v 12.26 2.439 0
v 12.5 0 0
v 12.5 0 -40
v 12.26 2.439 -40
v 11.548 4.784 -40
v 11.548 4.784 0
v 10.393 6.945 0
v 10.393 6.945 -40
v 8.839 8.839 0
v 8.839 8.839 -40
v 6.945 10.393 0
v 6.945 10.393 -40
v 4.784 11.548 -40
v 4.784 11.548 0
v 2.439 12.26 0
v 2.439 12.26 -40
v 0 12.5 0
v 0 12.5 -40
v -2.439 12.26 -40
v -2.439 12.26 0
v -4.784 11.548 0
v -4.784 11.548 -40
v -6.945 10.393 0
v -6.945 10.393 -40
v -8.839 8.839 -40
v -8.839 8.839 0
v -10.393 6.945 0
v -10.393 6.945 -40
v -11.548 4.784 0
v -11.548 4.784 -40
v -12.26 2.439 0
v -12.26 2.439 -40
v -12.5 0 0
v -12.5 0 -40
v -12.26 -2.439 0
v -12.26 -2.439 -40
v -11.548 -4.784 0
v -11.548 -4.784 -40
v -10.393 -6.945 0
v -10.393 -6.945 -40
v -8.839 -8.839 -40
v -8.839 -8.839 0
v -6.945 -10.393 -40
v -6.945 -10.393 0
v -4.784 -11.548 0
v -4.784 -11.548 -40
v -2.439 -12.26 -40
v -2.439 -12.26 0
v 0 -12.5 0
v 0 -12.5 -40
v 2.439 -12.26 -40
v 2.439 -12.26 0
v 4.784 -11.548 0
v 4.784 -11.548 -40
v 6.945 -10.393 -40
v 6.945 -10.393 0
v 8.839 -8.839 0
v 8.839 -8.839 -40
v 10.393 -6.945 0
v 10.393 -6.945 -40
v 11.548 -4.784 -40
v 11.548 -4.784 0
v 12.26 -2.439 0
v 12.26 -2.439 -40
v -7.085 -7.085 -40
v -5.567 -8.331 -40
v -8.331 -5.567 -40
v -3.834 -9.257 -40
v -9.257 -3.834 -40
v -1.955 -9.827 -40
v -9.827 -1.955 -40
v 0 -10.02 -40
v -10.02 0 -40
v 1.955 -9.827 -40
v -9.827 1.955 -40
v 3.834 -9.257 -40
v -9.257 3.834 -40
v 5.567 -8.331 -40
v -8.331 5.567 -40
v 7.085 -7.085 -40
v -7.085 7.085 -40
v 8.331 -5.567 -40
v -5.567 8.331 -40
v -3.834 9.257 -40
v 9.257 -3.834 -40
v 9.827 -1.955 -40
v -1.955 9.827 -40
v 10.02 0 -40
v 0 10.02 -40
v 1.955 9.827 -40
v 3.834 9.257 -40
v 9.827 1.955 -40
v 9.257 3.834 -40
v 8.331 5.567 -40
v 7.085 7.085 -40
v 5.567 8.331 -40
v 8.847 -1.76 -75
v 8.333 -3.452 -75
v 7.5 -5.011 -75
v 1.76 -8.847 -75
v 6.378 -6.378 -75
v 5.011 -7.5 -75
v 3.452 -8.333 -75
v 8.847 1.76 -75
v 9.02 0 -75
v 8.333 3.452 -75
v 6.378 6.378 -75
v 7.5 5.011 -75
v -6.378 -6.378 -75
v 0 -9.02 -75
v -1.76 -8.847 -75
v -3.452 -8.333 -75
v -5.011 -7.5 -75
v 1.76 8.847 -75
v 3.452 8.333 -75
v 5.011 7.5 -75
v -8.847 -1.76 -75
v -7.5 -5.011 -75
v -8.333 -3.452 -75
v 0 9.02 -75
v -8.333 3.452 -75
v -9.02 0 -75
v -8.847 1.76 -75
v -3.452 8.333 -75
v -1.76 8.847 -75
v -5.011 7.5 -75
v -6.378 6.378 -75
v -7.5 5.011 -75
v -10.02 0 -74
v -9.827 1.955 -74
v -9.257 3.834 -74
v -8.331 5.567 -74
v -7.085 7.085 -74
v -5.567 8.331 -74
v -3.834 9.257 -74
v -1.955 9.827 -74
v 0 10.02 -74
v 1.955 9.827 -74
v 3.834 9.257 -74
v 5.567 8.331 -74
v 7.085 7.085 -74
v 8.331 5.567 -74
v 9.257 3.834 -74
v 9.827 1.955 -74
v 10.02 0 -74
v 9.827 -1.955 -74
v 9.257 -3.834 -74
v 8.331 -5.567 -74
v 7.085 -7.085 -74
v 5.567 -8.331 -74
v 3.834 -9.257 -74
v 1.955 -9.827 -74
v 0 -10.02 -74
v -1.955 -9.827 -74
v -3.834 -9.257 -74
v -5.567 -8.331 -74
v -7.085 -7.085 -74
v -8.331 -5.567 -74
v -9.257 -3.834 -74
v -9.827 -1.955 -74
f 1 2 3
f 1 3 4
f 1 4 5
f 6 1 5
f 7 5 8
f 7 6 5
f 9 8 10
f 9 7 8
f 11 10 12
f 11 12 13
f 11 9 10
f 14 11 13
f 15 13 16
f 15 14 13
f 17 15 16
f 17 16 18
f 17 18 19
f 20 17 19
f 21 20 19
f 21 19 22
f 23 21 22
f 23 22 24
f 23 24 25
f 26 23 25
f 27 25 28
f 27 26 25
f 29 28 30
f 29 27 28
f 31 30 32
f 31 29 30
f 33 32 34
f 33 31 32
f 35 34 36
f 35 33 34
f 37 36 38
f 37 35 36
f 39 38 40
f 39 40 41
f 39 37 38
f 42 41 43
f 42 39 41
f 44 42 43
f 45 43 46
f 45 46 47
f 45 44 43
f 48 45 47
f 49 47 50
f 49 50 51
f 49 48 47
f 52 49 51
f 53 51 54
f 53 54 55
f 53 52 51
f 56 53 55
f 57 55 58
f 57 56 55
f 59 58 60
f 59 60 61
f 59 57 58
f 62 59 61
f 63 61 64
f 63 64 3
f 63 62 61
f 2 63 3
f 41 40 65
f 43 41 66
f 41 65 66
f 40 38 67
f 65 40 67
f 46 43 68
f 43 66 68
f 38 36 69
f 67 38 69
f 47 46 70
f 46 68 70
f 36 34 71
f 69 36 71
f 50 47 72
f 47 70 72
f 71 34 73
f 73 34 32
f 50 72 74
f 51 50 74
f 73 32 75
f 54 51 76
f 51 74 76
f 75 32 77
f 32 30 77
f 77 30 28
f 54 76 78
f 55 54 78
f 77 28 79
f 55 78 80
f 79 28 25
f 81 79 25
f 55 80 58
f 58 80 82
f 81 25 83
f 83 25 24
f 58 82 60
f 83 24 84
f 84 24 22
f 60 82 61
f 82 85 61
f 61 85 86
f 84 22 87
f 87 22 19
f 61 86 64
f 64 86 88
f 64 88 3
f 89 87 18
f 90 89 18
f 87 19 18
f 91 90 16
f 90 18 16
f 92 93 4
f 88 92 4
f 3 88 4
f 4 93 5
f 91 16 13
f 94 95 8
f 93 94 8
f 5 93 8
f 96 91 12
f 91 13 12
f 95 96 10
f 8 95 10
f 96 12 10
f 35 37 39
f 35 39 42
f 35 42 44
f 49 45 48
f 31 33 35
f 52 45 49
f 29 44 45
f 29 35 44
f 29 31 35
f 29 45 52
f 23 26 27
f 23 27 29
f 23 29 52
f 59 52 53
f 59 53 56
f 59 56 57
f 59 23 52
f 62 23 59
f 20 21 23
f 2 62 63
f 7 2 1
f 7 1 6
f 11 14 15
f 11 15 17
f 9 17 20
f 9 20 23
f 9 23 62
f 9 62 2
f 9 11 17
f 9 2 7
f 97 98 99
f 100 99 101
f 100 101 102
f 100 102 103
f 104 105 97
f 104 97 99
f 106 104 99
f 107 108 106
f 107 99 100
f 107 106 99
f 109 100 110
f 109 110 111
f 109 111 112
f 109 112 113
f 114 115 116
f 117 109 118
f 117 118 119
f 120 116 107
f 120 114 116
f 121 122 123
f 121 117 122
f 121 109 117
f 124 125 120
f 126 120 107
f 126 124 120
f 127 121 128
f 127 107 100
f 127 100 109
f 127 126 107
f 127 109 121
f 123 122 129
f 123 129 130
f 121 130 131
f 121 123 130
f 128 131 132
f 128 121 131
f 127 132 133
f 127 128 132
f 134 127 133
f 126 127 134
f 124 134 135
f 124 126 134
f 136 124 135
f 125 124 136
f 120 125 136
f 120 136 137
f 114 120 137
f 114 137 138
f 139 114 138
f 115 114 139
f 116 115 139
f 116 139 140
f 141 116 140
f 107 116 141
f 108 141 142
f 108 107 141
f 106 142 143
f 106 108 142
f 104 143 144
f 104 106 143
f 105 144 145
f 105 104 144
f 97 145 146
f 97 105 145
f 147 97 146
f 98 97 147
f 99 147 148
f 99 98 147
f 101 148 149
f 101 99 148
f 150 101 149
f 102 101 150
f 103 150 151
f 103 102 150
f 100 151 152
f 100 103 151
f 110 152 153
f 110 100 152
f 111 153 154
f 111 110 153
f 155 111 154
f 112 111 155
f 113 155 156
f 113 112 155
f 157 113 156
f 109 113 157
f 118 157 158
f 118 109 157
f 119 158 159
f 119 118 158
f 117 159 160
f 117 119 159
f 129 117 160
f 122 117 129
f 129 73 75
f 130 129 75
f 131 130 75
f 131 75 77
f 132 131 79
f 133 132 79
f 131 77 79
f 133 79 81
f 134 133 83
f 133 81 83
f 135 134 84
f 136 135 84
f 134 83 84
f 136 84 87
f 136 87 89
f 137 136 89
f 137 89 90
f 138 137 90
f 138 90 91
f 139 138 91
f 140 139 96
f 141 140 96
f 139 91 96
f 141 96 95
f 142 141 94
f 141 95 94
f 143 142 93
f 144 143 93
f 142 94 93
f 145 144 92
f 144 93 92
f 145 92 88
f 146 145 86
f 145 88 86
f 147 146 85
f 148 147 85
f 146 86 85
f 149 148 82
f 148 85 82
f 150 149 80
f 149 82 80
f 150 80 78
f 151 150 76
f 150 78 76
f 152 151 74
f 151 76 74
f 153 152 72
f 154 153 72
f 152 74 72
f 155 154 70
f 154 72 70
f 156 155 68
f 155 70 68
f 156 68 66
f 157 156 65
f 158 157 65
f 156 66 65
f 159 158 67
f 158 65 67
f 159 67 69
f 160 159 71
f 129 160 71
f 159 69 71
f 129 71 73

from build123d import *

# Parameters (mm, degrees)
SKETCH1_R           = 12.5
BOSS_EXTRUDE1_DEPTH = 40
SKETCH2_R           = 10.02
BOSS_EXTRUDE2_DEPTH = 35
CHAMFER1_SIZE       = 1


with BuildPart() as part:
    # Sketch1 → Boss-Extrude1 (new body)
    with BuildSketch(Plane.XY):
        Circle(SKETCH1_R)
    extrude(amount=-BOSS_EXTRUDE1_DEPTH)

    # Sketch2 → Boss-Extrude2 (add)
    with BuildSketch(Plane(origin=(0, 0, -40), x_dir=(-1, 0, 0), z_dir=(0, 0, -1))):
        Circle(SKETCH2_R)
    extrude(amount=BOSS_EXTRUDE2_DEPTH)

    # Chamfer1
    chamfer1_edges = [part.edges().sort_by_distance(p)[0] for p in [
        (10.02, 0, -75),
    ]]
    chamfer(chamfer1_edges, length=CHAMFER1_SIZE)


solid = part.part
